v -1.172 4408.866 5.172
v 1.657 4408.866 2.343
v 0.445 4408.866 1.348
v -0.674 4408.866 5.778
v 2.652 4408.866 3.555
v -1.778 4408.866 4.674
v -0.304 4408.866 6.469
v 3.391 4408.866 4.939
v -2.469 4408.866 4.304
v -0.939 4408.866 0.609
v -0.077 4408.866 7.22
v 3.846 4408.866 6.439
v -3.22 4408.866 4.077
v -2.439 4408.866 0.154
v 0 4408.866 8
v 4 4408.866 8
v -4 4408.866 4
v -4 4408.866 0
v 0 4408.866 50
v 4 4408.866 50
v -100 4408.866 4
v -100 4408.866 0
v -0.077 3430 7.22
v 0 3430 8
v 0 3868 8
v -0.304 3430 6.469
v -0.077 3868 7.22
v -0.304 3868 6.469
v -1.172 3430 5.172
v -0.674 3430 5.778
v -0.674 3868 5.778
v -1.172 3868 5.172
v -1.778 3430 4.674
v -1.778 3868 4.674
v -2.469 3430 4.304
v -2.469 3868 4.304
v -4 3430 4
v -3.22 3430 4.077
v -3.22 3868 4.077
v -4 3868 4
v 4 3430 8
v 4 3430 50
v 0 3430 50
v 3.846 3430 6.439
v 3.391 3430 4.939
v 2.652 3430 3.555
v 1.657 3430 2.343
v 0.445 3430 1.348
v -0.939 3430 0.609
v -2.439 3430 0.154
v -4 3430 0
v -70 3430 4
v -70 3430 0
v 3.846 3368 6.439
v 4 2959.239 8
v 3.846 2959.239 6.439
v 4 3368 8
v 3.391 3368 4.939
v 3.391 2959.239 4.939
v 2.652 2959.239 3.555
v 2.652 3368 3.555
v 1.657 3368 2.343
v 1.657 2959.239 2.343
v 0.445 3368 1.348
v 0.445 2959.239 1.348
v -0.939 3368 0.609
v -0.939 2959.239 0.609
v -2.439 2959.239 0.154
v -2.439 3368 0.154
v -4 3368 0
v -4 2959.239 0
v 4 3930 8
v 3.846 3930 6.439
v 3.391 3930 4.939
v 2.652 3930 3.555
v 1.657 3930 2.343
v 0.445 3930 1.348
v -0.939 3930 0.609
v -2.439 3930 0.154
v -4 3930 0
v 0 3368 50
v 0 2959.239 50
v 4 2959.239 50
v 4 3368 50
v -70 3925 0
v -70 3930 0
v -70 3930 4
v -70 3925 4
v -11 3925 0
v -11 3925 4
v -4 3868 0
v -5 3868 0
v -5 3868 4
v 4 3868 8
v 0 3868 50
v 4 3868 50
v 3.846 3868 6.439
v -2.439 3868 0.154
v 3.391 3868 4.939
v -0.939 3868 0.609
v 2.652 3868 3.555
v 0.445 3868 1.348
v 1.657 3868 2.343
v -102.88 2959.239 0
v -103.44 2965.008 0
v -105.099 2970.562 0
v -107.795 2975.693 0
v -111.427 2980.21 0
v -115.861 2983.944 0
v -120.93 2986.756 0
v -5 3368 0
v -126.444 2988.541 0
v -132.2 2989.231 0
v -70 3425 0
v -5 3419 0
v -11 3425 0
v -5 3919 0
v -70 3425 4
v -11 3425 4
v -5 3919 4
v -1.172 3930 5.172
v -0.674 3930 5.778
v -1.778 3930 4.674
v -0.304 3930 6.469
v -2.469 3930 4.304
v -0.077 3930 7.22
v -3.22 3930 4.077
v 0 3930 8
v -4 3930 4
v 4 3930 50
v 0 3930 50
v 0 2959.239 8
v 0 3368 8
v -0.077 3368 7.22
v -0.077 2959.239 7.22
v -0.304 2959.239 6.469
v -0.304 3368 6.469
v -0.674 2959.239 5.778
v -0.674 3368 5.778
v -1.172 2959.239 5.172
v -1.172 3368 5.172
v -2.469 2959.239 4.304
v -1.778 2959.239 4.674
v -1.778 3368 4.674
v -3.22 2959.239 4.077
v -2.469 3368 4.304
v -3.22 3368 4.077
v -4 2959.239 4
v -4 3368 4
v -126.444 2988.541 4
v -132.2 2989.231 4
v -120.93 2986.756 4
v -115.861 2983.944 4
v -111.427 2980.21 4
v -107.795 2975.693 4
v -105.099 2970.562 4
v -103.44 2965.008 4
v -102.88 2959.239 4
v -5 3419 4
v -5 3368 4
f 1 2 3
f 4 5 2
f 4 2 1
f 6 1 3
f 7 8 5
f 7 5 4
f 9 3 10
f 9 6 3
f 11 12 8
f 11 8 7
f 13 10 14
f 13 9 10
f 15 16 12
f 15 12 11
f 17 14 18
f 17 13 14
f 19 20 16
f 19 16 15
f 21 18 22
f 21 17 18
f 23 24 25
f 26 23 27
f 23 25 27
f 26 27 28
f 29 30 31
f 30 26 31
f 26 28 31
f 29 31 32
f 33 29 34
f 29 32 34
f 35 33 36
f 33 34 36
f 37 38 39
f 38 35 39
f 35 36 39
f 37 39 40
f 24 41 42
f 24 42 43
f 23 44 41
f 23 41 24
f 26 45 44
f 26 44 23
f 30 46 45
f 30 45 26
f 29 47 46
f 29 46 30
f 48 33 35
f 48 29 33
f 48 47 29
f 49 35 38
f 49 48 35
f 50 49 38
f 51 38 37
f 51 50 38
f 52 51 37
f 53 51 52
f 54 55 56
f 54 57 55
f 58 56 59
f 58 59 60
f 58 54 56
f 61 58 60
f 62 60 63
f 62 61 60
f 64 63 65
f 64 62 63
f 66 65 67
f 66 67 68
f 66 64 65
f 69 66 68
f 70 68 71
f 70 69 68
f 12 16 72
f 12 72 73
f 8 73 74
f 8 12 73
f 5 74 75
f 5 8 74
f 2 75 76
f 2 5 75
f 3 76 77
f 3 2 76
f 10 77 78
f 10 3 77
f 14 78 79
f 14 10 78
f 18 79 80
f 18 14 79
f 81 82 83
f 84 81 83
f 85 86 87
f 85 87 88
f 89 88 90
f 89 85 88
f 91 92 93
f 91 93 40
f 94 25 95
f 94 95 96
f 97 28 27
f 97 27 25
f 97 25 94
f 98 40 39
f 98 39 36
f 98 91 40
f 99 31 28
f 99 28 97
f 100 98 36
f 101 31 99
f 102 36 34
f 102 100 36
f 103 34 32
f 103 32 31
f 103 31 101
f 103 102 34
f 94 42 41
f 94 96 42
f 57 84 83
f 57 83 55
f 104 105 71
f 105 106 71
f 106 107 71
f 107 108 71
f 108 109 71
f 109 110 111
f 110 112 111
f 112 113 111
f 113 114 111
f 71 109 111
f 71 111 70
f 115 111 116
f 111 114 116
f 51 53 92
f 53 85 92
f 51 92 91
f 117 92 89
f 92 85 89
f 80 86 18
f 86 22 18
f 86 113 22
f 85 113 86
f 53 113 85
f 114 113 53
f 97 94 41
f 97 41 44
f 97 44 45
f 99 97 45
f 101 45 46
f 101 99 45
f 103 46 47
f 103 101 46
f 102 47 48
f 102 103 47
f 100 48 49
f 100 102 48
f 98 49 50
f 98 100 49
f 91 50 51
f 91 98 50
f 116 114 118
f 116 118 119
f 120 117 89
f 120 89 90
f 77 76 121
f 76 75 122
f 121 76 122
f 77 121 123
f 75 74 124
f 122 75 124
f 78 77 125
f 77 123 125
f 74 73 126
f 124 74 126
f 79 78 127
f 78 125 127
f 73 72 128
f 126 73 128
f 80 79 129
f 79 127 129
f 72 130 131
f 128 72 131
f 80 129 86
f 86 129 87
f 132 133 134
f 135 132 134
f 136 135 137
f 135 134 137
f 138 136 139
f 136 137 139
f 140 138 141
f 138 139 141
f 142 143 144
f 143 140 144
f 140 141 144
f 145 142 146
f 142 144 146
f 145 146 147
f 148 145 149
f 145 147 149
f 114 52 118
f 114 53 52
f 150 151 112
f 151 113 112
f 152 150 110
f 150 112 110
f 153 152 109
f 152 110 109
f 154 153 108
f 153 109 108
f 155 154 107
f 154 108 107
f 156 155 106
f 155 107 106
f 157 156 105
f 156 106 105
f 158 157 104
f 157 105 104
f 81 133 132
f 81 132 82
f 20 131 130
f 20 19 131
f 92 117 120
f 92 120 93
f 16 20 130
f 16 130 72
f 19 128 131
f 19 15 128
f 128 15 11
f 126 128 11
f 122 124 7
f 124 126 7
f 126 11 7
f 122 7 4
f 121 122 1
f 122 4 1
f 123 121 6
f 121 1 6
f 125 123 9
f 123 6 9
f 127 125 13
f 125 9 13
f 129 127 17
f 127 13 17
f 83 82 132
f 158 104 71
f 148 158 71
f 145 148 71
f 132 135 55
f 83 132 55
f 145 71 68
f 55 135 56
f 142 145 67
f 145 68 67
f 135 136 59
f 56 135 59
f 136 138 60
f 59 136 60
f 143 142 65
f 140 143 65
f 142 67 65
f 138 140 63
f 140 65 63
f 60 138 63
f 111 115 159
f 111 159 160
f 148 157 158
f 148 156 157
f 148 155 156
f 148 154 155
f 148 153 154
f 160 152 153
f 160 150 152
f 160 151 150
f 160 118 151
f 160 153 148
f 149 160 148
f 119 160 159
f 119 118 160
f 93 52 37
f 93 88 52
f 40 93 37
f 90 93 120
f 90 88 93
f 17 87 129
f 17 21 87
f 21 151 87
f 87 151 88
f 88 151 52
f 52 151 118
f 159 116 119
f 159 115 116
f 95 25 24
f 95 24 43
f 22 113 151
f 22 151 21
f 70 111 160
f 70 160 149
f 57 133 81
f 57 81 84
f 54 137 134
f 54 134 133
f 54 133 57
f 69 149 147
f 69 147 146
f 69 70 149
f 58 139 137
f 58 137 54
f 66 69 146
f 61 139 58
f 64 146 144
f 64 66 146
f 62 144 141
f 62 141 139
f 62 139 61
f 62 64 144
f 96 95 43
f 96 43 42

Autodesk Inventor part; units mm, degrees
ref_plane "YZ Plane" through (0, 0, 0) normal (1, 0, 0) x (0, 1, 0)
ref_plane "XZ Plane" through (0, 0, 0) normal (0, 1, 0) x (-1, 0, 0)
ref_plane "XY Plane" through (0, 0, 0) normal (0, 0, 1) x (1, 0, 0)
sketch "Sketch1" plane through (0, 0, 0) normal (0, 0, 1) x (1, 0, 0)
  line L0 (0, 0) -> (0, 1479.6195)
  line L1 (0, 1479.6195) -> (-166.4399, 1479.6195)
  line L2 (-166.4399, 1479.6195) -> (-200, 0)
  line L3 (-200, 0) -> (0, 0)
  line L4 (0, 430) -> (-5, 430)
  line L5 (-5, 430) -> (-5, 368)
  line L6 (-5, 368) -> (0, 368)
  line L7 (0, 368) -> (0, 430)
  line L8 (-5, 430) -> (-70, 430)
  line L9 (-70, 430) -> (-70, 425)
  line L10 (-70, 425) -> (-5, 425)
  line L11 (-5, 425) -> (-5, 430)
  line L12 (-70, 430) -> (-190.2469, 430) construction
  line L13 (0, 4408.8661) -> (0, 1479.6195)
  line L14 (-166.4399, 1479.6195) -> (-132.8798, 2959.2389)
  line L15 (0, 4408.8661) -> (-100, 4408.8661)
  line L16 (-132.8798, 2959.2389) -> (0, 2959.2389)
  line L17 (-132.8798, 2959.2389) -> (-100, 4408.8661)
  line L18 (-5, 868) -> (0, 868)
  line L19 (-70, 925) -> (-5, 925)
  line L20 (-5, 930) -> (-70, 930)
  line L21 (-70, 930) -> (-70, 925)
  line L22 (-5, 925) -> (-5, 930)
  line L23 (-5, 930) -> (-5, 868)
  line L24 (0, 868) -> (0, 930)
  line L25 (0, 930) -> (-5, 930)
  line L26 (-5, 1368) -> (0, 1368)
  line L27 (-70, 1425) -> (-5, 1425)
  line L28 (-5, 1430) -> (-70, 1430)
  line L29 (-70, 1430) -> (-70, 1425)
  line L30 (-5, 1425) -> (-5, 1430)
  line L31 (-5, 1430) -> (-5, 1368)
  line L32 (0, 1368) -> (0, 1430)
  line L33 (0, 1430) -> (-5, 1430)
  line L34 (-5, 1868) -> (0, 1868)
  line L35 (-70, 1925) -> (-5, 1925)
  line L36 (-5, 1930) -> (-70, 1930)
  line L37 (-70, 1930) -> (-70, 1925)
  line L38 (-5, 1925) -> (-5, 1930)
  line L39 (-5, 1930) -> (-5, 1868)
  line L40 (0, 1868) -> (0, 1930)
  line L41 (0, 1930) -> (-5, 1930)
  line L42 (-5, 2368) -> (0, 2368)
  line L43 (-70, 2425) -> (-5, 2425)
  line L44 (-5, 2430) -> (-70, 2430)
  line L45 (-70, 2430) -> (-70, 2425)
  line L46 (-5, 2425) -> (-5, 2430)
  line L47 (-5, 2430) -> (-5, 2368)
  line L48 (0, 2368) -> (0, 2430)
  line L49 (0, 2430) -> (-5, 2430)
  line L50 (-5, 2868) -> (0, 2868)
  line L51 (-70, 2925) -> (-5, 2925)
  line L52 (-5, 2930) -> (-70, 2930)
  line L53 (-70, 2930) -> (-70, 2925)
  line L54 (-5, 2925) -> (-5, 2930)
  line L55 (-5, 2930) -> (-5, 2868)
  line L56 (0, 2868) -> (0, 2930)
  line L57 (0, 2930) -> (-5, 2930)
  line L58 (-100, 4408.8661) -> (-99.3197, 4438.8584) construction
  line L59 (0, 1629.6195) -> (-163.0377, 1629.6195)
  line L60 (-131.0653, 3039.2389) -> (0, 3039.2389)
  line L61 (-5, 3368) -> (0, 3368)
  line L62 (-70, 3425) -> (-5, 3425)
  line L63 (-5, 3430) -> (-70, 3430)
  line L64 (-70, 3430) -> (-70, 3425)
  line L65 (-5, 3425) -> (-5, 3430)
  line L66 (-5, 3430) -> (-5, 3368)
  line L67 (0, 3368) -> (0, 3430)
  line L68 (0, 3430) -> (-5, 3430)
  line L69 (-5, 3868) -> (0, 3868)
  line L70 (-70, 3925) -> (-5, 3925)
  line L71 (-5, 3930) -> (-70, 3930)
  line L72 (-70, 3930) -> (-70, 3925)
  line L73 (-5, 3925) -> (-5, 3930)
  line L74 (-5, 3930) -> (-5, 3868)
  line L75 (0, 3868) -> (0, 3930)
  line L76 (0, 3930) -> (-5, 3930)
  arc A0 (-140, 0) -> (-198.6395, 59.9846) centre (-200, 0) ccw
  arc A1 (-167.1202, 1449.6272) -> (-165.7596, 1509.6117) centre (-166.4399, 1479.6195) ccw
  arc A2 (-133.5601, 2929.2466) -> (-132.1995, 2989.2312) centre (-132.8798, 2959.2389) ccw
  line L77 (0, 930) -> (-70, 930)
  line L78 (-70, 930) -> (-178.9061, 930) construction
  line L79 (-70, 1430) -> (-167.5654, 1430) construction
  line L80 (-70, 1930) -> (-156.2246, 1930) construction
  line L81 (-70, 2430) -> (-144.8838, 2430) construction
  line L82 (-70, 2930) -> (-133.543, 2930) construction
  line L83 (-70, 3430) -> (-122.2022, 3430) construction
  line L84 (-70, 3930) -> (-110.8614, 3930) construction
  point P0 (0, 430)
  point P1 (-136.4399, 1479.6195)
  point P2 (0, 2368)
  point P3 (0, 2868)
  point P4 (0, 1868)
  point P5 (-102.8798, 2959.2389)
  point P6 (0, 3368)
  point P7 (0, 3868)
  dimension "d25" = 430
  dimension "d32" = 1480
  dimension "d33" = 1480
  dimension "d34" = 1450
  dimension "d35" = 100
  dimension "d38" = 500
  dimension "d44" = 30
  dimension "d45" = 150
  dimension "d46" = 80
  dimension "d47" = 200
  dimension "d48" = 5
  dimension "d50" = 62
  dimension "d51" = 60
  dimension "d52" = 30
  dimension "d53" = 478.8661
  dimension "d54" = 30
  dimension "d56" = 190.2469
  dimension "d57" = 178.9061
  dimension "d58" = 167.5654
  dimension "d59" = 156.2246
  dimension "d60" = 144.8838
  dimension "d61" = 133.543
  dimension "d62" = 122.2022
  dimension "d63" = 110.8614
  dimension "d64" = 70
extrude "Plate1" add sketch "Sketch1" along normal blind 4 contours A2 L17 L60 L13 L16 | L17 L15 L13 L76 L71 L72 L70 L74 L69 L68 L63 L64 L62 L66 L61 L60
sketch "Sketch2" plane through (4, 4408.8661, 0) normal (-1, 0, 0) x (0, -1, 0)
  line L0 (478.8661, 0) -> (0, 0)
  line L1 (0, 0) -> (0, 50)
  line L2 (0, 50) -> (478.8661, 50)
  line L3 (478.8661, 50) -> (478.8661, 0)
edge flange "Flange1" height 50 angle 90 thickness 4 bend radius 4 thickness toward (-1, 0, 0) relief tear relief width 4 relief depth 2 corner gap 4 corner form 0 edges at (0, 4169.433, 4) (0, 3649, 4) (0, 3163.6195, 4) wall of the first edge with corners at (4, 3930, 0) (4, 4408.8661, 0) (4, 4408.8661, 50) (4, 3930, 50)
bend "Bend1"
corner "Corner1"
chamfer "Corner Chamfer1" distance 6 angle 45 2 edges at (-5, 3425, 2) (-5, 3925, 2)
equation "\"d5\" = Thickness"
equation "\"d7\" = BendReliefWidth"
equation "\"d8\" = BendReliefDepth"
equation "\"d9\" = MinimumRemnant"
equation "\"d10\" = TransitionRadius"
equation "\"d13\" = BendRadius"
equation "\"d14\" = CornerReliefSize"
equation "\"d15\" = GapSize"
equation "\"d16\" = JacobiRadiusSize"
equation "\"BendRadius\" = Thickness"
equation "\"BendReliefWidth\" = Thickness"
equation "\"BendReliefDepth\" = 0.5 * Thickness"
equation "\"CornerReliefSize\" = 4 * Thickness"
equation "\"MinimumRemnant\" = 2 * Thickness"
equation "\"TransitionRadius\" = BendRadius"
equation "\"JacobiRadiusSize\" = BendRadius"
equation "\"GapSize\" = Thickness"
equation "\"Thickness\" = 4"
properties part number "03.1 GBK main3  rib" material "Steel"
